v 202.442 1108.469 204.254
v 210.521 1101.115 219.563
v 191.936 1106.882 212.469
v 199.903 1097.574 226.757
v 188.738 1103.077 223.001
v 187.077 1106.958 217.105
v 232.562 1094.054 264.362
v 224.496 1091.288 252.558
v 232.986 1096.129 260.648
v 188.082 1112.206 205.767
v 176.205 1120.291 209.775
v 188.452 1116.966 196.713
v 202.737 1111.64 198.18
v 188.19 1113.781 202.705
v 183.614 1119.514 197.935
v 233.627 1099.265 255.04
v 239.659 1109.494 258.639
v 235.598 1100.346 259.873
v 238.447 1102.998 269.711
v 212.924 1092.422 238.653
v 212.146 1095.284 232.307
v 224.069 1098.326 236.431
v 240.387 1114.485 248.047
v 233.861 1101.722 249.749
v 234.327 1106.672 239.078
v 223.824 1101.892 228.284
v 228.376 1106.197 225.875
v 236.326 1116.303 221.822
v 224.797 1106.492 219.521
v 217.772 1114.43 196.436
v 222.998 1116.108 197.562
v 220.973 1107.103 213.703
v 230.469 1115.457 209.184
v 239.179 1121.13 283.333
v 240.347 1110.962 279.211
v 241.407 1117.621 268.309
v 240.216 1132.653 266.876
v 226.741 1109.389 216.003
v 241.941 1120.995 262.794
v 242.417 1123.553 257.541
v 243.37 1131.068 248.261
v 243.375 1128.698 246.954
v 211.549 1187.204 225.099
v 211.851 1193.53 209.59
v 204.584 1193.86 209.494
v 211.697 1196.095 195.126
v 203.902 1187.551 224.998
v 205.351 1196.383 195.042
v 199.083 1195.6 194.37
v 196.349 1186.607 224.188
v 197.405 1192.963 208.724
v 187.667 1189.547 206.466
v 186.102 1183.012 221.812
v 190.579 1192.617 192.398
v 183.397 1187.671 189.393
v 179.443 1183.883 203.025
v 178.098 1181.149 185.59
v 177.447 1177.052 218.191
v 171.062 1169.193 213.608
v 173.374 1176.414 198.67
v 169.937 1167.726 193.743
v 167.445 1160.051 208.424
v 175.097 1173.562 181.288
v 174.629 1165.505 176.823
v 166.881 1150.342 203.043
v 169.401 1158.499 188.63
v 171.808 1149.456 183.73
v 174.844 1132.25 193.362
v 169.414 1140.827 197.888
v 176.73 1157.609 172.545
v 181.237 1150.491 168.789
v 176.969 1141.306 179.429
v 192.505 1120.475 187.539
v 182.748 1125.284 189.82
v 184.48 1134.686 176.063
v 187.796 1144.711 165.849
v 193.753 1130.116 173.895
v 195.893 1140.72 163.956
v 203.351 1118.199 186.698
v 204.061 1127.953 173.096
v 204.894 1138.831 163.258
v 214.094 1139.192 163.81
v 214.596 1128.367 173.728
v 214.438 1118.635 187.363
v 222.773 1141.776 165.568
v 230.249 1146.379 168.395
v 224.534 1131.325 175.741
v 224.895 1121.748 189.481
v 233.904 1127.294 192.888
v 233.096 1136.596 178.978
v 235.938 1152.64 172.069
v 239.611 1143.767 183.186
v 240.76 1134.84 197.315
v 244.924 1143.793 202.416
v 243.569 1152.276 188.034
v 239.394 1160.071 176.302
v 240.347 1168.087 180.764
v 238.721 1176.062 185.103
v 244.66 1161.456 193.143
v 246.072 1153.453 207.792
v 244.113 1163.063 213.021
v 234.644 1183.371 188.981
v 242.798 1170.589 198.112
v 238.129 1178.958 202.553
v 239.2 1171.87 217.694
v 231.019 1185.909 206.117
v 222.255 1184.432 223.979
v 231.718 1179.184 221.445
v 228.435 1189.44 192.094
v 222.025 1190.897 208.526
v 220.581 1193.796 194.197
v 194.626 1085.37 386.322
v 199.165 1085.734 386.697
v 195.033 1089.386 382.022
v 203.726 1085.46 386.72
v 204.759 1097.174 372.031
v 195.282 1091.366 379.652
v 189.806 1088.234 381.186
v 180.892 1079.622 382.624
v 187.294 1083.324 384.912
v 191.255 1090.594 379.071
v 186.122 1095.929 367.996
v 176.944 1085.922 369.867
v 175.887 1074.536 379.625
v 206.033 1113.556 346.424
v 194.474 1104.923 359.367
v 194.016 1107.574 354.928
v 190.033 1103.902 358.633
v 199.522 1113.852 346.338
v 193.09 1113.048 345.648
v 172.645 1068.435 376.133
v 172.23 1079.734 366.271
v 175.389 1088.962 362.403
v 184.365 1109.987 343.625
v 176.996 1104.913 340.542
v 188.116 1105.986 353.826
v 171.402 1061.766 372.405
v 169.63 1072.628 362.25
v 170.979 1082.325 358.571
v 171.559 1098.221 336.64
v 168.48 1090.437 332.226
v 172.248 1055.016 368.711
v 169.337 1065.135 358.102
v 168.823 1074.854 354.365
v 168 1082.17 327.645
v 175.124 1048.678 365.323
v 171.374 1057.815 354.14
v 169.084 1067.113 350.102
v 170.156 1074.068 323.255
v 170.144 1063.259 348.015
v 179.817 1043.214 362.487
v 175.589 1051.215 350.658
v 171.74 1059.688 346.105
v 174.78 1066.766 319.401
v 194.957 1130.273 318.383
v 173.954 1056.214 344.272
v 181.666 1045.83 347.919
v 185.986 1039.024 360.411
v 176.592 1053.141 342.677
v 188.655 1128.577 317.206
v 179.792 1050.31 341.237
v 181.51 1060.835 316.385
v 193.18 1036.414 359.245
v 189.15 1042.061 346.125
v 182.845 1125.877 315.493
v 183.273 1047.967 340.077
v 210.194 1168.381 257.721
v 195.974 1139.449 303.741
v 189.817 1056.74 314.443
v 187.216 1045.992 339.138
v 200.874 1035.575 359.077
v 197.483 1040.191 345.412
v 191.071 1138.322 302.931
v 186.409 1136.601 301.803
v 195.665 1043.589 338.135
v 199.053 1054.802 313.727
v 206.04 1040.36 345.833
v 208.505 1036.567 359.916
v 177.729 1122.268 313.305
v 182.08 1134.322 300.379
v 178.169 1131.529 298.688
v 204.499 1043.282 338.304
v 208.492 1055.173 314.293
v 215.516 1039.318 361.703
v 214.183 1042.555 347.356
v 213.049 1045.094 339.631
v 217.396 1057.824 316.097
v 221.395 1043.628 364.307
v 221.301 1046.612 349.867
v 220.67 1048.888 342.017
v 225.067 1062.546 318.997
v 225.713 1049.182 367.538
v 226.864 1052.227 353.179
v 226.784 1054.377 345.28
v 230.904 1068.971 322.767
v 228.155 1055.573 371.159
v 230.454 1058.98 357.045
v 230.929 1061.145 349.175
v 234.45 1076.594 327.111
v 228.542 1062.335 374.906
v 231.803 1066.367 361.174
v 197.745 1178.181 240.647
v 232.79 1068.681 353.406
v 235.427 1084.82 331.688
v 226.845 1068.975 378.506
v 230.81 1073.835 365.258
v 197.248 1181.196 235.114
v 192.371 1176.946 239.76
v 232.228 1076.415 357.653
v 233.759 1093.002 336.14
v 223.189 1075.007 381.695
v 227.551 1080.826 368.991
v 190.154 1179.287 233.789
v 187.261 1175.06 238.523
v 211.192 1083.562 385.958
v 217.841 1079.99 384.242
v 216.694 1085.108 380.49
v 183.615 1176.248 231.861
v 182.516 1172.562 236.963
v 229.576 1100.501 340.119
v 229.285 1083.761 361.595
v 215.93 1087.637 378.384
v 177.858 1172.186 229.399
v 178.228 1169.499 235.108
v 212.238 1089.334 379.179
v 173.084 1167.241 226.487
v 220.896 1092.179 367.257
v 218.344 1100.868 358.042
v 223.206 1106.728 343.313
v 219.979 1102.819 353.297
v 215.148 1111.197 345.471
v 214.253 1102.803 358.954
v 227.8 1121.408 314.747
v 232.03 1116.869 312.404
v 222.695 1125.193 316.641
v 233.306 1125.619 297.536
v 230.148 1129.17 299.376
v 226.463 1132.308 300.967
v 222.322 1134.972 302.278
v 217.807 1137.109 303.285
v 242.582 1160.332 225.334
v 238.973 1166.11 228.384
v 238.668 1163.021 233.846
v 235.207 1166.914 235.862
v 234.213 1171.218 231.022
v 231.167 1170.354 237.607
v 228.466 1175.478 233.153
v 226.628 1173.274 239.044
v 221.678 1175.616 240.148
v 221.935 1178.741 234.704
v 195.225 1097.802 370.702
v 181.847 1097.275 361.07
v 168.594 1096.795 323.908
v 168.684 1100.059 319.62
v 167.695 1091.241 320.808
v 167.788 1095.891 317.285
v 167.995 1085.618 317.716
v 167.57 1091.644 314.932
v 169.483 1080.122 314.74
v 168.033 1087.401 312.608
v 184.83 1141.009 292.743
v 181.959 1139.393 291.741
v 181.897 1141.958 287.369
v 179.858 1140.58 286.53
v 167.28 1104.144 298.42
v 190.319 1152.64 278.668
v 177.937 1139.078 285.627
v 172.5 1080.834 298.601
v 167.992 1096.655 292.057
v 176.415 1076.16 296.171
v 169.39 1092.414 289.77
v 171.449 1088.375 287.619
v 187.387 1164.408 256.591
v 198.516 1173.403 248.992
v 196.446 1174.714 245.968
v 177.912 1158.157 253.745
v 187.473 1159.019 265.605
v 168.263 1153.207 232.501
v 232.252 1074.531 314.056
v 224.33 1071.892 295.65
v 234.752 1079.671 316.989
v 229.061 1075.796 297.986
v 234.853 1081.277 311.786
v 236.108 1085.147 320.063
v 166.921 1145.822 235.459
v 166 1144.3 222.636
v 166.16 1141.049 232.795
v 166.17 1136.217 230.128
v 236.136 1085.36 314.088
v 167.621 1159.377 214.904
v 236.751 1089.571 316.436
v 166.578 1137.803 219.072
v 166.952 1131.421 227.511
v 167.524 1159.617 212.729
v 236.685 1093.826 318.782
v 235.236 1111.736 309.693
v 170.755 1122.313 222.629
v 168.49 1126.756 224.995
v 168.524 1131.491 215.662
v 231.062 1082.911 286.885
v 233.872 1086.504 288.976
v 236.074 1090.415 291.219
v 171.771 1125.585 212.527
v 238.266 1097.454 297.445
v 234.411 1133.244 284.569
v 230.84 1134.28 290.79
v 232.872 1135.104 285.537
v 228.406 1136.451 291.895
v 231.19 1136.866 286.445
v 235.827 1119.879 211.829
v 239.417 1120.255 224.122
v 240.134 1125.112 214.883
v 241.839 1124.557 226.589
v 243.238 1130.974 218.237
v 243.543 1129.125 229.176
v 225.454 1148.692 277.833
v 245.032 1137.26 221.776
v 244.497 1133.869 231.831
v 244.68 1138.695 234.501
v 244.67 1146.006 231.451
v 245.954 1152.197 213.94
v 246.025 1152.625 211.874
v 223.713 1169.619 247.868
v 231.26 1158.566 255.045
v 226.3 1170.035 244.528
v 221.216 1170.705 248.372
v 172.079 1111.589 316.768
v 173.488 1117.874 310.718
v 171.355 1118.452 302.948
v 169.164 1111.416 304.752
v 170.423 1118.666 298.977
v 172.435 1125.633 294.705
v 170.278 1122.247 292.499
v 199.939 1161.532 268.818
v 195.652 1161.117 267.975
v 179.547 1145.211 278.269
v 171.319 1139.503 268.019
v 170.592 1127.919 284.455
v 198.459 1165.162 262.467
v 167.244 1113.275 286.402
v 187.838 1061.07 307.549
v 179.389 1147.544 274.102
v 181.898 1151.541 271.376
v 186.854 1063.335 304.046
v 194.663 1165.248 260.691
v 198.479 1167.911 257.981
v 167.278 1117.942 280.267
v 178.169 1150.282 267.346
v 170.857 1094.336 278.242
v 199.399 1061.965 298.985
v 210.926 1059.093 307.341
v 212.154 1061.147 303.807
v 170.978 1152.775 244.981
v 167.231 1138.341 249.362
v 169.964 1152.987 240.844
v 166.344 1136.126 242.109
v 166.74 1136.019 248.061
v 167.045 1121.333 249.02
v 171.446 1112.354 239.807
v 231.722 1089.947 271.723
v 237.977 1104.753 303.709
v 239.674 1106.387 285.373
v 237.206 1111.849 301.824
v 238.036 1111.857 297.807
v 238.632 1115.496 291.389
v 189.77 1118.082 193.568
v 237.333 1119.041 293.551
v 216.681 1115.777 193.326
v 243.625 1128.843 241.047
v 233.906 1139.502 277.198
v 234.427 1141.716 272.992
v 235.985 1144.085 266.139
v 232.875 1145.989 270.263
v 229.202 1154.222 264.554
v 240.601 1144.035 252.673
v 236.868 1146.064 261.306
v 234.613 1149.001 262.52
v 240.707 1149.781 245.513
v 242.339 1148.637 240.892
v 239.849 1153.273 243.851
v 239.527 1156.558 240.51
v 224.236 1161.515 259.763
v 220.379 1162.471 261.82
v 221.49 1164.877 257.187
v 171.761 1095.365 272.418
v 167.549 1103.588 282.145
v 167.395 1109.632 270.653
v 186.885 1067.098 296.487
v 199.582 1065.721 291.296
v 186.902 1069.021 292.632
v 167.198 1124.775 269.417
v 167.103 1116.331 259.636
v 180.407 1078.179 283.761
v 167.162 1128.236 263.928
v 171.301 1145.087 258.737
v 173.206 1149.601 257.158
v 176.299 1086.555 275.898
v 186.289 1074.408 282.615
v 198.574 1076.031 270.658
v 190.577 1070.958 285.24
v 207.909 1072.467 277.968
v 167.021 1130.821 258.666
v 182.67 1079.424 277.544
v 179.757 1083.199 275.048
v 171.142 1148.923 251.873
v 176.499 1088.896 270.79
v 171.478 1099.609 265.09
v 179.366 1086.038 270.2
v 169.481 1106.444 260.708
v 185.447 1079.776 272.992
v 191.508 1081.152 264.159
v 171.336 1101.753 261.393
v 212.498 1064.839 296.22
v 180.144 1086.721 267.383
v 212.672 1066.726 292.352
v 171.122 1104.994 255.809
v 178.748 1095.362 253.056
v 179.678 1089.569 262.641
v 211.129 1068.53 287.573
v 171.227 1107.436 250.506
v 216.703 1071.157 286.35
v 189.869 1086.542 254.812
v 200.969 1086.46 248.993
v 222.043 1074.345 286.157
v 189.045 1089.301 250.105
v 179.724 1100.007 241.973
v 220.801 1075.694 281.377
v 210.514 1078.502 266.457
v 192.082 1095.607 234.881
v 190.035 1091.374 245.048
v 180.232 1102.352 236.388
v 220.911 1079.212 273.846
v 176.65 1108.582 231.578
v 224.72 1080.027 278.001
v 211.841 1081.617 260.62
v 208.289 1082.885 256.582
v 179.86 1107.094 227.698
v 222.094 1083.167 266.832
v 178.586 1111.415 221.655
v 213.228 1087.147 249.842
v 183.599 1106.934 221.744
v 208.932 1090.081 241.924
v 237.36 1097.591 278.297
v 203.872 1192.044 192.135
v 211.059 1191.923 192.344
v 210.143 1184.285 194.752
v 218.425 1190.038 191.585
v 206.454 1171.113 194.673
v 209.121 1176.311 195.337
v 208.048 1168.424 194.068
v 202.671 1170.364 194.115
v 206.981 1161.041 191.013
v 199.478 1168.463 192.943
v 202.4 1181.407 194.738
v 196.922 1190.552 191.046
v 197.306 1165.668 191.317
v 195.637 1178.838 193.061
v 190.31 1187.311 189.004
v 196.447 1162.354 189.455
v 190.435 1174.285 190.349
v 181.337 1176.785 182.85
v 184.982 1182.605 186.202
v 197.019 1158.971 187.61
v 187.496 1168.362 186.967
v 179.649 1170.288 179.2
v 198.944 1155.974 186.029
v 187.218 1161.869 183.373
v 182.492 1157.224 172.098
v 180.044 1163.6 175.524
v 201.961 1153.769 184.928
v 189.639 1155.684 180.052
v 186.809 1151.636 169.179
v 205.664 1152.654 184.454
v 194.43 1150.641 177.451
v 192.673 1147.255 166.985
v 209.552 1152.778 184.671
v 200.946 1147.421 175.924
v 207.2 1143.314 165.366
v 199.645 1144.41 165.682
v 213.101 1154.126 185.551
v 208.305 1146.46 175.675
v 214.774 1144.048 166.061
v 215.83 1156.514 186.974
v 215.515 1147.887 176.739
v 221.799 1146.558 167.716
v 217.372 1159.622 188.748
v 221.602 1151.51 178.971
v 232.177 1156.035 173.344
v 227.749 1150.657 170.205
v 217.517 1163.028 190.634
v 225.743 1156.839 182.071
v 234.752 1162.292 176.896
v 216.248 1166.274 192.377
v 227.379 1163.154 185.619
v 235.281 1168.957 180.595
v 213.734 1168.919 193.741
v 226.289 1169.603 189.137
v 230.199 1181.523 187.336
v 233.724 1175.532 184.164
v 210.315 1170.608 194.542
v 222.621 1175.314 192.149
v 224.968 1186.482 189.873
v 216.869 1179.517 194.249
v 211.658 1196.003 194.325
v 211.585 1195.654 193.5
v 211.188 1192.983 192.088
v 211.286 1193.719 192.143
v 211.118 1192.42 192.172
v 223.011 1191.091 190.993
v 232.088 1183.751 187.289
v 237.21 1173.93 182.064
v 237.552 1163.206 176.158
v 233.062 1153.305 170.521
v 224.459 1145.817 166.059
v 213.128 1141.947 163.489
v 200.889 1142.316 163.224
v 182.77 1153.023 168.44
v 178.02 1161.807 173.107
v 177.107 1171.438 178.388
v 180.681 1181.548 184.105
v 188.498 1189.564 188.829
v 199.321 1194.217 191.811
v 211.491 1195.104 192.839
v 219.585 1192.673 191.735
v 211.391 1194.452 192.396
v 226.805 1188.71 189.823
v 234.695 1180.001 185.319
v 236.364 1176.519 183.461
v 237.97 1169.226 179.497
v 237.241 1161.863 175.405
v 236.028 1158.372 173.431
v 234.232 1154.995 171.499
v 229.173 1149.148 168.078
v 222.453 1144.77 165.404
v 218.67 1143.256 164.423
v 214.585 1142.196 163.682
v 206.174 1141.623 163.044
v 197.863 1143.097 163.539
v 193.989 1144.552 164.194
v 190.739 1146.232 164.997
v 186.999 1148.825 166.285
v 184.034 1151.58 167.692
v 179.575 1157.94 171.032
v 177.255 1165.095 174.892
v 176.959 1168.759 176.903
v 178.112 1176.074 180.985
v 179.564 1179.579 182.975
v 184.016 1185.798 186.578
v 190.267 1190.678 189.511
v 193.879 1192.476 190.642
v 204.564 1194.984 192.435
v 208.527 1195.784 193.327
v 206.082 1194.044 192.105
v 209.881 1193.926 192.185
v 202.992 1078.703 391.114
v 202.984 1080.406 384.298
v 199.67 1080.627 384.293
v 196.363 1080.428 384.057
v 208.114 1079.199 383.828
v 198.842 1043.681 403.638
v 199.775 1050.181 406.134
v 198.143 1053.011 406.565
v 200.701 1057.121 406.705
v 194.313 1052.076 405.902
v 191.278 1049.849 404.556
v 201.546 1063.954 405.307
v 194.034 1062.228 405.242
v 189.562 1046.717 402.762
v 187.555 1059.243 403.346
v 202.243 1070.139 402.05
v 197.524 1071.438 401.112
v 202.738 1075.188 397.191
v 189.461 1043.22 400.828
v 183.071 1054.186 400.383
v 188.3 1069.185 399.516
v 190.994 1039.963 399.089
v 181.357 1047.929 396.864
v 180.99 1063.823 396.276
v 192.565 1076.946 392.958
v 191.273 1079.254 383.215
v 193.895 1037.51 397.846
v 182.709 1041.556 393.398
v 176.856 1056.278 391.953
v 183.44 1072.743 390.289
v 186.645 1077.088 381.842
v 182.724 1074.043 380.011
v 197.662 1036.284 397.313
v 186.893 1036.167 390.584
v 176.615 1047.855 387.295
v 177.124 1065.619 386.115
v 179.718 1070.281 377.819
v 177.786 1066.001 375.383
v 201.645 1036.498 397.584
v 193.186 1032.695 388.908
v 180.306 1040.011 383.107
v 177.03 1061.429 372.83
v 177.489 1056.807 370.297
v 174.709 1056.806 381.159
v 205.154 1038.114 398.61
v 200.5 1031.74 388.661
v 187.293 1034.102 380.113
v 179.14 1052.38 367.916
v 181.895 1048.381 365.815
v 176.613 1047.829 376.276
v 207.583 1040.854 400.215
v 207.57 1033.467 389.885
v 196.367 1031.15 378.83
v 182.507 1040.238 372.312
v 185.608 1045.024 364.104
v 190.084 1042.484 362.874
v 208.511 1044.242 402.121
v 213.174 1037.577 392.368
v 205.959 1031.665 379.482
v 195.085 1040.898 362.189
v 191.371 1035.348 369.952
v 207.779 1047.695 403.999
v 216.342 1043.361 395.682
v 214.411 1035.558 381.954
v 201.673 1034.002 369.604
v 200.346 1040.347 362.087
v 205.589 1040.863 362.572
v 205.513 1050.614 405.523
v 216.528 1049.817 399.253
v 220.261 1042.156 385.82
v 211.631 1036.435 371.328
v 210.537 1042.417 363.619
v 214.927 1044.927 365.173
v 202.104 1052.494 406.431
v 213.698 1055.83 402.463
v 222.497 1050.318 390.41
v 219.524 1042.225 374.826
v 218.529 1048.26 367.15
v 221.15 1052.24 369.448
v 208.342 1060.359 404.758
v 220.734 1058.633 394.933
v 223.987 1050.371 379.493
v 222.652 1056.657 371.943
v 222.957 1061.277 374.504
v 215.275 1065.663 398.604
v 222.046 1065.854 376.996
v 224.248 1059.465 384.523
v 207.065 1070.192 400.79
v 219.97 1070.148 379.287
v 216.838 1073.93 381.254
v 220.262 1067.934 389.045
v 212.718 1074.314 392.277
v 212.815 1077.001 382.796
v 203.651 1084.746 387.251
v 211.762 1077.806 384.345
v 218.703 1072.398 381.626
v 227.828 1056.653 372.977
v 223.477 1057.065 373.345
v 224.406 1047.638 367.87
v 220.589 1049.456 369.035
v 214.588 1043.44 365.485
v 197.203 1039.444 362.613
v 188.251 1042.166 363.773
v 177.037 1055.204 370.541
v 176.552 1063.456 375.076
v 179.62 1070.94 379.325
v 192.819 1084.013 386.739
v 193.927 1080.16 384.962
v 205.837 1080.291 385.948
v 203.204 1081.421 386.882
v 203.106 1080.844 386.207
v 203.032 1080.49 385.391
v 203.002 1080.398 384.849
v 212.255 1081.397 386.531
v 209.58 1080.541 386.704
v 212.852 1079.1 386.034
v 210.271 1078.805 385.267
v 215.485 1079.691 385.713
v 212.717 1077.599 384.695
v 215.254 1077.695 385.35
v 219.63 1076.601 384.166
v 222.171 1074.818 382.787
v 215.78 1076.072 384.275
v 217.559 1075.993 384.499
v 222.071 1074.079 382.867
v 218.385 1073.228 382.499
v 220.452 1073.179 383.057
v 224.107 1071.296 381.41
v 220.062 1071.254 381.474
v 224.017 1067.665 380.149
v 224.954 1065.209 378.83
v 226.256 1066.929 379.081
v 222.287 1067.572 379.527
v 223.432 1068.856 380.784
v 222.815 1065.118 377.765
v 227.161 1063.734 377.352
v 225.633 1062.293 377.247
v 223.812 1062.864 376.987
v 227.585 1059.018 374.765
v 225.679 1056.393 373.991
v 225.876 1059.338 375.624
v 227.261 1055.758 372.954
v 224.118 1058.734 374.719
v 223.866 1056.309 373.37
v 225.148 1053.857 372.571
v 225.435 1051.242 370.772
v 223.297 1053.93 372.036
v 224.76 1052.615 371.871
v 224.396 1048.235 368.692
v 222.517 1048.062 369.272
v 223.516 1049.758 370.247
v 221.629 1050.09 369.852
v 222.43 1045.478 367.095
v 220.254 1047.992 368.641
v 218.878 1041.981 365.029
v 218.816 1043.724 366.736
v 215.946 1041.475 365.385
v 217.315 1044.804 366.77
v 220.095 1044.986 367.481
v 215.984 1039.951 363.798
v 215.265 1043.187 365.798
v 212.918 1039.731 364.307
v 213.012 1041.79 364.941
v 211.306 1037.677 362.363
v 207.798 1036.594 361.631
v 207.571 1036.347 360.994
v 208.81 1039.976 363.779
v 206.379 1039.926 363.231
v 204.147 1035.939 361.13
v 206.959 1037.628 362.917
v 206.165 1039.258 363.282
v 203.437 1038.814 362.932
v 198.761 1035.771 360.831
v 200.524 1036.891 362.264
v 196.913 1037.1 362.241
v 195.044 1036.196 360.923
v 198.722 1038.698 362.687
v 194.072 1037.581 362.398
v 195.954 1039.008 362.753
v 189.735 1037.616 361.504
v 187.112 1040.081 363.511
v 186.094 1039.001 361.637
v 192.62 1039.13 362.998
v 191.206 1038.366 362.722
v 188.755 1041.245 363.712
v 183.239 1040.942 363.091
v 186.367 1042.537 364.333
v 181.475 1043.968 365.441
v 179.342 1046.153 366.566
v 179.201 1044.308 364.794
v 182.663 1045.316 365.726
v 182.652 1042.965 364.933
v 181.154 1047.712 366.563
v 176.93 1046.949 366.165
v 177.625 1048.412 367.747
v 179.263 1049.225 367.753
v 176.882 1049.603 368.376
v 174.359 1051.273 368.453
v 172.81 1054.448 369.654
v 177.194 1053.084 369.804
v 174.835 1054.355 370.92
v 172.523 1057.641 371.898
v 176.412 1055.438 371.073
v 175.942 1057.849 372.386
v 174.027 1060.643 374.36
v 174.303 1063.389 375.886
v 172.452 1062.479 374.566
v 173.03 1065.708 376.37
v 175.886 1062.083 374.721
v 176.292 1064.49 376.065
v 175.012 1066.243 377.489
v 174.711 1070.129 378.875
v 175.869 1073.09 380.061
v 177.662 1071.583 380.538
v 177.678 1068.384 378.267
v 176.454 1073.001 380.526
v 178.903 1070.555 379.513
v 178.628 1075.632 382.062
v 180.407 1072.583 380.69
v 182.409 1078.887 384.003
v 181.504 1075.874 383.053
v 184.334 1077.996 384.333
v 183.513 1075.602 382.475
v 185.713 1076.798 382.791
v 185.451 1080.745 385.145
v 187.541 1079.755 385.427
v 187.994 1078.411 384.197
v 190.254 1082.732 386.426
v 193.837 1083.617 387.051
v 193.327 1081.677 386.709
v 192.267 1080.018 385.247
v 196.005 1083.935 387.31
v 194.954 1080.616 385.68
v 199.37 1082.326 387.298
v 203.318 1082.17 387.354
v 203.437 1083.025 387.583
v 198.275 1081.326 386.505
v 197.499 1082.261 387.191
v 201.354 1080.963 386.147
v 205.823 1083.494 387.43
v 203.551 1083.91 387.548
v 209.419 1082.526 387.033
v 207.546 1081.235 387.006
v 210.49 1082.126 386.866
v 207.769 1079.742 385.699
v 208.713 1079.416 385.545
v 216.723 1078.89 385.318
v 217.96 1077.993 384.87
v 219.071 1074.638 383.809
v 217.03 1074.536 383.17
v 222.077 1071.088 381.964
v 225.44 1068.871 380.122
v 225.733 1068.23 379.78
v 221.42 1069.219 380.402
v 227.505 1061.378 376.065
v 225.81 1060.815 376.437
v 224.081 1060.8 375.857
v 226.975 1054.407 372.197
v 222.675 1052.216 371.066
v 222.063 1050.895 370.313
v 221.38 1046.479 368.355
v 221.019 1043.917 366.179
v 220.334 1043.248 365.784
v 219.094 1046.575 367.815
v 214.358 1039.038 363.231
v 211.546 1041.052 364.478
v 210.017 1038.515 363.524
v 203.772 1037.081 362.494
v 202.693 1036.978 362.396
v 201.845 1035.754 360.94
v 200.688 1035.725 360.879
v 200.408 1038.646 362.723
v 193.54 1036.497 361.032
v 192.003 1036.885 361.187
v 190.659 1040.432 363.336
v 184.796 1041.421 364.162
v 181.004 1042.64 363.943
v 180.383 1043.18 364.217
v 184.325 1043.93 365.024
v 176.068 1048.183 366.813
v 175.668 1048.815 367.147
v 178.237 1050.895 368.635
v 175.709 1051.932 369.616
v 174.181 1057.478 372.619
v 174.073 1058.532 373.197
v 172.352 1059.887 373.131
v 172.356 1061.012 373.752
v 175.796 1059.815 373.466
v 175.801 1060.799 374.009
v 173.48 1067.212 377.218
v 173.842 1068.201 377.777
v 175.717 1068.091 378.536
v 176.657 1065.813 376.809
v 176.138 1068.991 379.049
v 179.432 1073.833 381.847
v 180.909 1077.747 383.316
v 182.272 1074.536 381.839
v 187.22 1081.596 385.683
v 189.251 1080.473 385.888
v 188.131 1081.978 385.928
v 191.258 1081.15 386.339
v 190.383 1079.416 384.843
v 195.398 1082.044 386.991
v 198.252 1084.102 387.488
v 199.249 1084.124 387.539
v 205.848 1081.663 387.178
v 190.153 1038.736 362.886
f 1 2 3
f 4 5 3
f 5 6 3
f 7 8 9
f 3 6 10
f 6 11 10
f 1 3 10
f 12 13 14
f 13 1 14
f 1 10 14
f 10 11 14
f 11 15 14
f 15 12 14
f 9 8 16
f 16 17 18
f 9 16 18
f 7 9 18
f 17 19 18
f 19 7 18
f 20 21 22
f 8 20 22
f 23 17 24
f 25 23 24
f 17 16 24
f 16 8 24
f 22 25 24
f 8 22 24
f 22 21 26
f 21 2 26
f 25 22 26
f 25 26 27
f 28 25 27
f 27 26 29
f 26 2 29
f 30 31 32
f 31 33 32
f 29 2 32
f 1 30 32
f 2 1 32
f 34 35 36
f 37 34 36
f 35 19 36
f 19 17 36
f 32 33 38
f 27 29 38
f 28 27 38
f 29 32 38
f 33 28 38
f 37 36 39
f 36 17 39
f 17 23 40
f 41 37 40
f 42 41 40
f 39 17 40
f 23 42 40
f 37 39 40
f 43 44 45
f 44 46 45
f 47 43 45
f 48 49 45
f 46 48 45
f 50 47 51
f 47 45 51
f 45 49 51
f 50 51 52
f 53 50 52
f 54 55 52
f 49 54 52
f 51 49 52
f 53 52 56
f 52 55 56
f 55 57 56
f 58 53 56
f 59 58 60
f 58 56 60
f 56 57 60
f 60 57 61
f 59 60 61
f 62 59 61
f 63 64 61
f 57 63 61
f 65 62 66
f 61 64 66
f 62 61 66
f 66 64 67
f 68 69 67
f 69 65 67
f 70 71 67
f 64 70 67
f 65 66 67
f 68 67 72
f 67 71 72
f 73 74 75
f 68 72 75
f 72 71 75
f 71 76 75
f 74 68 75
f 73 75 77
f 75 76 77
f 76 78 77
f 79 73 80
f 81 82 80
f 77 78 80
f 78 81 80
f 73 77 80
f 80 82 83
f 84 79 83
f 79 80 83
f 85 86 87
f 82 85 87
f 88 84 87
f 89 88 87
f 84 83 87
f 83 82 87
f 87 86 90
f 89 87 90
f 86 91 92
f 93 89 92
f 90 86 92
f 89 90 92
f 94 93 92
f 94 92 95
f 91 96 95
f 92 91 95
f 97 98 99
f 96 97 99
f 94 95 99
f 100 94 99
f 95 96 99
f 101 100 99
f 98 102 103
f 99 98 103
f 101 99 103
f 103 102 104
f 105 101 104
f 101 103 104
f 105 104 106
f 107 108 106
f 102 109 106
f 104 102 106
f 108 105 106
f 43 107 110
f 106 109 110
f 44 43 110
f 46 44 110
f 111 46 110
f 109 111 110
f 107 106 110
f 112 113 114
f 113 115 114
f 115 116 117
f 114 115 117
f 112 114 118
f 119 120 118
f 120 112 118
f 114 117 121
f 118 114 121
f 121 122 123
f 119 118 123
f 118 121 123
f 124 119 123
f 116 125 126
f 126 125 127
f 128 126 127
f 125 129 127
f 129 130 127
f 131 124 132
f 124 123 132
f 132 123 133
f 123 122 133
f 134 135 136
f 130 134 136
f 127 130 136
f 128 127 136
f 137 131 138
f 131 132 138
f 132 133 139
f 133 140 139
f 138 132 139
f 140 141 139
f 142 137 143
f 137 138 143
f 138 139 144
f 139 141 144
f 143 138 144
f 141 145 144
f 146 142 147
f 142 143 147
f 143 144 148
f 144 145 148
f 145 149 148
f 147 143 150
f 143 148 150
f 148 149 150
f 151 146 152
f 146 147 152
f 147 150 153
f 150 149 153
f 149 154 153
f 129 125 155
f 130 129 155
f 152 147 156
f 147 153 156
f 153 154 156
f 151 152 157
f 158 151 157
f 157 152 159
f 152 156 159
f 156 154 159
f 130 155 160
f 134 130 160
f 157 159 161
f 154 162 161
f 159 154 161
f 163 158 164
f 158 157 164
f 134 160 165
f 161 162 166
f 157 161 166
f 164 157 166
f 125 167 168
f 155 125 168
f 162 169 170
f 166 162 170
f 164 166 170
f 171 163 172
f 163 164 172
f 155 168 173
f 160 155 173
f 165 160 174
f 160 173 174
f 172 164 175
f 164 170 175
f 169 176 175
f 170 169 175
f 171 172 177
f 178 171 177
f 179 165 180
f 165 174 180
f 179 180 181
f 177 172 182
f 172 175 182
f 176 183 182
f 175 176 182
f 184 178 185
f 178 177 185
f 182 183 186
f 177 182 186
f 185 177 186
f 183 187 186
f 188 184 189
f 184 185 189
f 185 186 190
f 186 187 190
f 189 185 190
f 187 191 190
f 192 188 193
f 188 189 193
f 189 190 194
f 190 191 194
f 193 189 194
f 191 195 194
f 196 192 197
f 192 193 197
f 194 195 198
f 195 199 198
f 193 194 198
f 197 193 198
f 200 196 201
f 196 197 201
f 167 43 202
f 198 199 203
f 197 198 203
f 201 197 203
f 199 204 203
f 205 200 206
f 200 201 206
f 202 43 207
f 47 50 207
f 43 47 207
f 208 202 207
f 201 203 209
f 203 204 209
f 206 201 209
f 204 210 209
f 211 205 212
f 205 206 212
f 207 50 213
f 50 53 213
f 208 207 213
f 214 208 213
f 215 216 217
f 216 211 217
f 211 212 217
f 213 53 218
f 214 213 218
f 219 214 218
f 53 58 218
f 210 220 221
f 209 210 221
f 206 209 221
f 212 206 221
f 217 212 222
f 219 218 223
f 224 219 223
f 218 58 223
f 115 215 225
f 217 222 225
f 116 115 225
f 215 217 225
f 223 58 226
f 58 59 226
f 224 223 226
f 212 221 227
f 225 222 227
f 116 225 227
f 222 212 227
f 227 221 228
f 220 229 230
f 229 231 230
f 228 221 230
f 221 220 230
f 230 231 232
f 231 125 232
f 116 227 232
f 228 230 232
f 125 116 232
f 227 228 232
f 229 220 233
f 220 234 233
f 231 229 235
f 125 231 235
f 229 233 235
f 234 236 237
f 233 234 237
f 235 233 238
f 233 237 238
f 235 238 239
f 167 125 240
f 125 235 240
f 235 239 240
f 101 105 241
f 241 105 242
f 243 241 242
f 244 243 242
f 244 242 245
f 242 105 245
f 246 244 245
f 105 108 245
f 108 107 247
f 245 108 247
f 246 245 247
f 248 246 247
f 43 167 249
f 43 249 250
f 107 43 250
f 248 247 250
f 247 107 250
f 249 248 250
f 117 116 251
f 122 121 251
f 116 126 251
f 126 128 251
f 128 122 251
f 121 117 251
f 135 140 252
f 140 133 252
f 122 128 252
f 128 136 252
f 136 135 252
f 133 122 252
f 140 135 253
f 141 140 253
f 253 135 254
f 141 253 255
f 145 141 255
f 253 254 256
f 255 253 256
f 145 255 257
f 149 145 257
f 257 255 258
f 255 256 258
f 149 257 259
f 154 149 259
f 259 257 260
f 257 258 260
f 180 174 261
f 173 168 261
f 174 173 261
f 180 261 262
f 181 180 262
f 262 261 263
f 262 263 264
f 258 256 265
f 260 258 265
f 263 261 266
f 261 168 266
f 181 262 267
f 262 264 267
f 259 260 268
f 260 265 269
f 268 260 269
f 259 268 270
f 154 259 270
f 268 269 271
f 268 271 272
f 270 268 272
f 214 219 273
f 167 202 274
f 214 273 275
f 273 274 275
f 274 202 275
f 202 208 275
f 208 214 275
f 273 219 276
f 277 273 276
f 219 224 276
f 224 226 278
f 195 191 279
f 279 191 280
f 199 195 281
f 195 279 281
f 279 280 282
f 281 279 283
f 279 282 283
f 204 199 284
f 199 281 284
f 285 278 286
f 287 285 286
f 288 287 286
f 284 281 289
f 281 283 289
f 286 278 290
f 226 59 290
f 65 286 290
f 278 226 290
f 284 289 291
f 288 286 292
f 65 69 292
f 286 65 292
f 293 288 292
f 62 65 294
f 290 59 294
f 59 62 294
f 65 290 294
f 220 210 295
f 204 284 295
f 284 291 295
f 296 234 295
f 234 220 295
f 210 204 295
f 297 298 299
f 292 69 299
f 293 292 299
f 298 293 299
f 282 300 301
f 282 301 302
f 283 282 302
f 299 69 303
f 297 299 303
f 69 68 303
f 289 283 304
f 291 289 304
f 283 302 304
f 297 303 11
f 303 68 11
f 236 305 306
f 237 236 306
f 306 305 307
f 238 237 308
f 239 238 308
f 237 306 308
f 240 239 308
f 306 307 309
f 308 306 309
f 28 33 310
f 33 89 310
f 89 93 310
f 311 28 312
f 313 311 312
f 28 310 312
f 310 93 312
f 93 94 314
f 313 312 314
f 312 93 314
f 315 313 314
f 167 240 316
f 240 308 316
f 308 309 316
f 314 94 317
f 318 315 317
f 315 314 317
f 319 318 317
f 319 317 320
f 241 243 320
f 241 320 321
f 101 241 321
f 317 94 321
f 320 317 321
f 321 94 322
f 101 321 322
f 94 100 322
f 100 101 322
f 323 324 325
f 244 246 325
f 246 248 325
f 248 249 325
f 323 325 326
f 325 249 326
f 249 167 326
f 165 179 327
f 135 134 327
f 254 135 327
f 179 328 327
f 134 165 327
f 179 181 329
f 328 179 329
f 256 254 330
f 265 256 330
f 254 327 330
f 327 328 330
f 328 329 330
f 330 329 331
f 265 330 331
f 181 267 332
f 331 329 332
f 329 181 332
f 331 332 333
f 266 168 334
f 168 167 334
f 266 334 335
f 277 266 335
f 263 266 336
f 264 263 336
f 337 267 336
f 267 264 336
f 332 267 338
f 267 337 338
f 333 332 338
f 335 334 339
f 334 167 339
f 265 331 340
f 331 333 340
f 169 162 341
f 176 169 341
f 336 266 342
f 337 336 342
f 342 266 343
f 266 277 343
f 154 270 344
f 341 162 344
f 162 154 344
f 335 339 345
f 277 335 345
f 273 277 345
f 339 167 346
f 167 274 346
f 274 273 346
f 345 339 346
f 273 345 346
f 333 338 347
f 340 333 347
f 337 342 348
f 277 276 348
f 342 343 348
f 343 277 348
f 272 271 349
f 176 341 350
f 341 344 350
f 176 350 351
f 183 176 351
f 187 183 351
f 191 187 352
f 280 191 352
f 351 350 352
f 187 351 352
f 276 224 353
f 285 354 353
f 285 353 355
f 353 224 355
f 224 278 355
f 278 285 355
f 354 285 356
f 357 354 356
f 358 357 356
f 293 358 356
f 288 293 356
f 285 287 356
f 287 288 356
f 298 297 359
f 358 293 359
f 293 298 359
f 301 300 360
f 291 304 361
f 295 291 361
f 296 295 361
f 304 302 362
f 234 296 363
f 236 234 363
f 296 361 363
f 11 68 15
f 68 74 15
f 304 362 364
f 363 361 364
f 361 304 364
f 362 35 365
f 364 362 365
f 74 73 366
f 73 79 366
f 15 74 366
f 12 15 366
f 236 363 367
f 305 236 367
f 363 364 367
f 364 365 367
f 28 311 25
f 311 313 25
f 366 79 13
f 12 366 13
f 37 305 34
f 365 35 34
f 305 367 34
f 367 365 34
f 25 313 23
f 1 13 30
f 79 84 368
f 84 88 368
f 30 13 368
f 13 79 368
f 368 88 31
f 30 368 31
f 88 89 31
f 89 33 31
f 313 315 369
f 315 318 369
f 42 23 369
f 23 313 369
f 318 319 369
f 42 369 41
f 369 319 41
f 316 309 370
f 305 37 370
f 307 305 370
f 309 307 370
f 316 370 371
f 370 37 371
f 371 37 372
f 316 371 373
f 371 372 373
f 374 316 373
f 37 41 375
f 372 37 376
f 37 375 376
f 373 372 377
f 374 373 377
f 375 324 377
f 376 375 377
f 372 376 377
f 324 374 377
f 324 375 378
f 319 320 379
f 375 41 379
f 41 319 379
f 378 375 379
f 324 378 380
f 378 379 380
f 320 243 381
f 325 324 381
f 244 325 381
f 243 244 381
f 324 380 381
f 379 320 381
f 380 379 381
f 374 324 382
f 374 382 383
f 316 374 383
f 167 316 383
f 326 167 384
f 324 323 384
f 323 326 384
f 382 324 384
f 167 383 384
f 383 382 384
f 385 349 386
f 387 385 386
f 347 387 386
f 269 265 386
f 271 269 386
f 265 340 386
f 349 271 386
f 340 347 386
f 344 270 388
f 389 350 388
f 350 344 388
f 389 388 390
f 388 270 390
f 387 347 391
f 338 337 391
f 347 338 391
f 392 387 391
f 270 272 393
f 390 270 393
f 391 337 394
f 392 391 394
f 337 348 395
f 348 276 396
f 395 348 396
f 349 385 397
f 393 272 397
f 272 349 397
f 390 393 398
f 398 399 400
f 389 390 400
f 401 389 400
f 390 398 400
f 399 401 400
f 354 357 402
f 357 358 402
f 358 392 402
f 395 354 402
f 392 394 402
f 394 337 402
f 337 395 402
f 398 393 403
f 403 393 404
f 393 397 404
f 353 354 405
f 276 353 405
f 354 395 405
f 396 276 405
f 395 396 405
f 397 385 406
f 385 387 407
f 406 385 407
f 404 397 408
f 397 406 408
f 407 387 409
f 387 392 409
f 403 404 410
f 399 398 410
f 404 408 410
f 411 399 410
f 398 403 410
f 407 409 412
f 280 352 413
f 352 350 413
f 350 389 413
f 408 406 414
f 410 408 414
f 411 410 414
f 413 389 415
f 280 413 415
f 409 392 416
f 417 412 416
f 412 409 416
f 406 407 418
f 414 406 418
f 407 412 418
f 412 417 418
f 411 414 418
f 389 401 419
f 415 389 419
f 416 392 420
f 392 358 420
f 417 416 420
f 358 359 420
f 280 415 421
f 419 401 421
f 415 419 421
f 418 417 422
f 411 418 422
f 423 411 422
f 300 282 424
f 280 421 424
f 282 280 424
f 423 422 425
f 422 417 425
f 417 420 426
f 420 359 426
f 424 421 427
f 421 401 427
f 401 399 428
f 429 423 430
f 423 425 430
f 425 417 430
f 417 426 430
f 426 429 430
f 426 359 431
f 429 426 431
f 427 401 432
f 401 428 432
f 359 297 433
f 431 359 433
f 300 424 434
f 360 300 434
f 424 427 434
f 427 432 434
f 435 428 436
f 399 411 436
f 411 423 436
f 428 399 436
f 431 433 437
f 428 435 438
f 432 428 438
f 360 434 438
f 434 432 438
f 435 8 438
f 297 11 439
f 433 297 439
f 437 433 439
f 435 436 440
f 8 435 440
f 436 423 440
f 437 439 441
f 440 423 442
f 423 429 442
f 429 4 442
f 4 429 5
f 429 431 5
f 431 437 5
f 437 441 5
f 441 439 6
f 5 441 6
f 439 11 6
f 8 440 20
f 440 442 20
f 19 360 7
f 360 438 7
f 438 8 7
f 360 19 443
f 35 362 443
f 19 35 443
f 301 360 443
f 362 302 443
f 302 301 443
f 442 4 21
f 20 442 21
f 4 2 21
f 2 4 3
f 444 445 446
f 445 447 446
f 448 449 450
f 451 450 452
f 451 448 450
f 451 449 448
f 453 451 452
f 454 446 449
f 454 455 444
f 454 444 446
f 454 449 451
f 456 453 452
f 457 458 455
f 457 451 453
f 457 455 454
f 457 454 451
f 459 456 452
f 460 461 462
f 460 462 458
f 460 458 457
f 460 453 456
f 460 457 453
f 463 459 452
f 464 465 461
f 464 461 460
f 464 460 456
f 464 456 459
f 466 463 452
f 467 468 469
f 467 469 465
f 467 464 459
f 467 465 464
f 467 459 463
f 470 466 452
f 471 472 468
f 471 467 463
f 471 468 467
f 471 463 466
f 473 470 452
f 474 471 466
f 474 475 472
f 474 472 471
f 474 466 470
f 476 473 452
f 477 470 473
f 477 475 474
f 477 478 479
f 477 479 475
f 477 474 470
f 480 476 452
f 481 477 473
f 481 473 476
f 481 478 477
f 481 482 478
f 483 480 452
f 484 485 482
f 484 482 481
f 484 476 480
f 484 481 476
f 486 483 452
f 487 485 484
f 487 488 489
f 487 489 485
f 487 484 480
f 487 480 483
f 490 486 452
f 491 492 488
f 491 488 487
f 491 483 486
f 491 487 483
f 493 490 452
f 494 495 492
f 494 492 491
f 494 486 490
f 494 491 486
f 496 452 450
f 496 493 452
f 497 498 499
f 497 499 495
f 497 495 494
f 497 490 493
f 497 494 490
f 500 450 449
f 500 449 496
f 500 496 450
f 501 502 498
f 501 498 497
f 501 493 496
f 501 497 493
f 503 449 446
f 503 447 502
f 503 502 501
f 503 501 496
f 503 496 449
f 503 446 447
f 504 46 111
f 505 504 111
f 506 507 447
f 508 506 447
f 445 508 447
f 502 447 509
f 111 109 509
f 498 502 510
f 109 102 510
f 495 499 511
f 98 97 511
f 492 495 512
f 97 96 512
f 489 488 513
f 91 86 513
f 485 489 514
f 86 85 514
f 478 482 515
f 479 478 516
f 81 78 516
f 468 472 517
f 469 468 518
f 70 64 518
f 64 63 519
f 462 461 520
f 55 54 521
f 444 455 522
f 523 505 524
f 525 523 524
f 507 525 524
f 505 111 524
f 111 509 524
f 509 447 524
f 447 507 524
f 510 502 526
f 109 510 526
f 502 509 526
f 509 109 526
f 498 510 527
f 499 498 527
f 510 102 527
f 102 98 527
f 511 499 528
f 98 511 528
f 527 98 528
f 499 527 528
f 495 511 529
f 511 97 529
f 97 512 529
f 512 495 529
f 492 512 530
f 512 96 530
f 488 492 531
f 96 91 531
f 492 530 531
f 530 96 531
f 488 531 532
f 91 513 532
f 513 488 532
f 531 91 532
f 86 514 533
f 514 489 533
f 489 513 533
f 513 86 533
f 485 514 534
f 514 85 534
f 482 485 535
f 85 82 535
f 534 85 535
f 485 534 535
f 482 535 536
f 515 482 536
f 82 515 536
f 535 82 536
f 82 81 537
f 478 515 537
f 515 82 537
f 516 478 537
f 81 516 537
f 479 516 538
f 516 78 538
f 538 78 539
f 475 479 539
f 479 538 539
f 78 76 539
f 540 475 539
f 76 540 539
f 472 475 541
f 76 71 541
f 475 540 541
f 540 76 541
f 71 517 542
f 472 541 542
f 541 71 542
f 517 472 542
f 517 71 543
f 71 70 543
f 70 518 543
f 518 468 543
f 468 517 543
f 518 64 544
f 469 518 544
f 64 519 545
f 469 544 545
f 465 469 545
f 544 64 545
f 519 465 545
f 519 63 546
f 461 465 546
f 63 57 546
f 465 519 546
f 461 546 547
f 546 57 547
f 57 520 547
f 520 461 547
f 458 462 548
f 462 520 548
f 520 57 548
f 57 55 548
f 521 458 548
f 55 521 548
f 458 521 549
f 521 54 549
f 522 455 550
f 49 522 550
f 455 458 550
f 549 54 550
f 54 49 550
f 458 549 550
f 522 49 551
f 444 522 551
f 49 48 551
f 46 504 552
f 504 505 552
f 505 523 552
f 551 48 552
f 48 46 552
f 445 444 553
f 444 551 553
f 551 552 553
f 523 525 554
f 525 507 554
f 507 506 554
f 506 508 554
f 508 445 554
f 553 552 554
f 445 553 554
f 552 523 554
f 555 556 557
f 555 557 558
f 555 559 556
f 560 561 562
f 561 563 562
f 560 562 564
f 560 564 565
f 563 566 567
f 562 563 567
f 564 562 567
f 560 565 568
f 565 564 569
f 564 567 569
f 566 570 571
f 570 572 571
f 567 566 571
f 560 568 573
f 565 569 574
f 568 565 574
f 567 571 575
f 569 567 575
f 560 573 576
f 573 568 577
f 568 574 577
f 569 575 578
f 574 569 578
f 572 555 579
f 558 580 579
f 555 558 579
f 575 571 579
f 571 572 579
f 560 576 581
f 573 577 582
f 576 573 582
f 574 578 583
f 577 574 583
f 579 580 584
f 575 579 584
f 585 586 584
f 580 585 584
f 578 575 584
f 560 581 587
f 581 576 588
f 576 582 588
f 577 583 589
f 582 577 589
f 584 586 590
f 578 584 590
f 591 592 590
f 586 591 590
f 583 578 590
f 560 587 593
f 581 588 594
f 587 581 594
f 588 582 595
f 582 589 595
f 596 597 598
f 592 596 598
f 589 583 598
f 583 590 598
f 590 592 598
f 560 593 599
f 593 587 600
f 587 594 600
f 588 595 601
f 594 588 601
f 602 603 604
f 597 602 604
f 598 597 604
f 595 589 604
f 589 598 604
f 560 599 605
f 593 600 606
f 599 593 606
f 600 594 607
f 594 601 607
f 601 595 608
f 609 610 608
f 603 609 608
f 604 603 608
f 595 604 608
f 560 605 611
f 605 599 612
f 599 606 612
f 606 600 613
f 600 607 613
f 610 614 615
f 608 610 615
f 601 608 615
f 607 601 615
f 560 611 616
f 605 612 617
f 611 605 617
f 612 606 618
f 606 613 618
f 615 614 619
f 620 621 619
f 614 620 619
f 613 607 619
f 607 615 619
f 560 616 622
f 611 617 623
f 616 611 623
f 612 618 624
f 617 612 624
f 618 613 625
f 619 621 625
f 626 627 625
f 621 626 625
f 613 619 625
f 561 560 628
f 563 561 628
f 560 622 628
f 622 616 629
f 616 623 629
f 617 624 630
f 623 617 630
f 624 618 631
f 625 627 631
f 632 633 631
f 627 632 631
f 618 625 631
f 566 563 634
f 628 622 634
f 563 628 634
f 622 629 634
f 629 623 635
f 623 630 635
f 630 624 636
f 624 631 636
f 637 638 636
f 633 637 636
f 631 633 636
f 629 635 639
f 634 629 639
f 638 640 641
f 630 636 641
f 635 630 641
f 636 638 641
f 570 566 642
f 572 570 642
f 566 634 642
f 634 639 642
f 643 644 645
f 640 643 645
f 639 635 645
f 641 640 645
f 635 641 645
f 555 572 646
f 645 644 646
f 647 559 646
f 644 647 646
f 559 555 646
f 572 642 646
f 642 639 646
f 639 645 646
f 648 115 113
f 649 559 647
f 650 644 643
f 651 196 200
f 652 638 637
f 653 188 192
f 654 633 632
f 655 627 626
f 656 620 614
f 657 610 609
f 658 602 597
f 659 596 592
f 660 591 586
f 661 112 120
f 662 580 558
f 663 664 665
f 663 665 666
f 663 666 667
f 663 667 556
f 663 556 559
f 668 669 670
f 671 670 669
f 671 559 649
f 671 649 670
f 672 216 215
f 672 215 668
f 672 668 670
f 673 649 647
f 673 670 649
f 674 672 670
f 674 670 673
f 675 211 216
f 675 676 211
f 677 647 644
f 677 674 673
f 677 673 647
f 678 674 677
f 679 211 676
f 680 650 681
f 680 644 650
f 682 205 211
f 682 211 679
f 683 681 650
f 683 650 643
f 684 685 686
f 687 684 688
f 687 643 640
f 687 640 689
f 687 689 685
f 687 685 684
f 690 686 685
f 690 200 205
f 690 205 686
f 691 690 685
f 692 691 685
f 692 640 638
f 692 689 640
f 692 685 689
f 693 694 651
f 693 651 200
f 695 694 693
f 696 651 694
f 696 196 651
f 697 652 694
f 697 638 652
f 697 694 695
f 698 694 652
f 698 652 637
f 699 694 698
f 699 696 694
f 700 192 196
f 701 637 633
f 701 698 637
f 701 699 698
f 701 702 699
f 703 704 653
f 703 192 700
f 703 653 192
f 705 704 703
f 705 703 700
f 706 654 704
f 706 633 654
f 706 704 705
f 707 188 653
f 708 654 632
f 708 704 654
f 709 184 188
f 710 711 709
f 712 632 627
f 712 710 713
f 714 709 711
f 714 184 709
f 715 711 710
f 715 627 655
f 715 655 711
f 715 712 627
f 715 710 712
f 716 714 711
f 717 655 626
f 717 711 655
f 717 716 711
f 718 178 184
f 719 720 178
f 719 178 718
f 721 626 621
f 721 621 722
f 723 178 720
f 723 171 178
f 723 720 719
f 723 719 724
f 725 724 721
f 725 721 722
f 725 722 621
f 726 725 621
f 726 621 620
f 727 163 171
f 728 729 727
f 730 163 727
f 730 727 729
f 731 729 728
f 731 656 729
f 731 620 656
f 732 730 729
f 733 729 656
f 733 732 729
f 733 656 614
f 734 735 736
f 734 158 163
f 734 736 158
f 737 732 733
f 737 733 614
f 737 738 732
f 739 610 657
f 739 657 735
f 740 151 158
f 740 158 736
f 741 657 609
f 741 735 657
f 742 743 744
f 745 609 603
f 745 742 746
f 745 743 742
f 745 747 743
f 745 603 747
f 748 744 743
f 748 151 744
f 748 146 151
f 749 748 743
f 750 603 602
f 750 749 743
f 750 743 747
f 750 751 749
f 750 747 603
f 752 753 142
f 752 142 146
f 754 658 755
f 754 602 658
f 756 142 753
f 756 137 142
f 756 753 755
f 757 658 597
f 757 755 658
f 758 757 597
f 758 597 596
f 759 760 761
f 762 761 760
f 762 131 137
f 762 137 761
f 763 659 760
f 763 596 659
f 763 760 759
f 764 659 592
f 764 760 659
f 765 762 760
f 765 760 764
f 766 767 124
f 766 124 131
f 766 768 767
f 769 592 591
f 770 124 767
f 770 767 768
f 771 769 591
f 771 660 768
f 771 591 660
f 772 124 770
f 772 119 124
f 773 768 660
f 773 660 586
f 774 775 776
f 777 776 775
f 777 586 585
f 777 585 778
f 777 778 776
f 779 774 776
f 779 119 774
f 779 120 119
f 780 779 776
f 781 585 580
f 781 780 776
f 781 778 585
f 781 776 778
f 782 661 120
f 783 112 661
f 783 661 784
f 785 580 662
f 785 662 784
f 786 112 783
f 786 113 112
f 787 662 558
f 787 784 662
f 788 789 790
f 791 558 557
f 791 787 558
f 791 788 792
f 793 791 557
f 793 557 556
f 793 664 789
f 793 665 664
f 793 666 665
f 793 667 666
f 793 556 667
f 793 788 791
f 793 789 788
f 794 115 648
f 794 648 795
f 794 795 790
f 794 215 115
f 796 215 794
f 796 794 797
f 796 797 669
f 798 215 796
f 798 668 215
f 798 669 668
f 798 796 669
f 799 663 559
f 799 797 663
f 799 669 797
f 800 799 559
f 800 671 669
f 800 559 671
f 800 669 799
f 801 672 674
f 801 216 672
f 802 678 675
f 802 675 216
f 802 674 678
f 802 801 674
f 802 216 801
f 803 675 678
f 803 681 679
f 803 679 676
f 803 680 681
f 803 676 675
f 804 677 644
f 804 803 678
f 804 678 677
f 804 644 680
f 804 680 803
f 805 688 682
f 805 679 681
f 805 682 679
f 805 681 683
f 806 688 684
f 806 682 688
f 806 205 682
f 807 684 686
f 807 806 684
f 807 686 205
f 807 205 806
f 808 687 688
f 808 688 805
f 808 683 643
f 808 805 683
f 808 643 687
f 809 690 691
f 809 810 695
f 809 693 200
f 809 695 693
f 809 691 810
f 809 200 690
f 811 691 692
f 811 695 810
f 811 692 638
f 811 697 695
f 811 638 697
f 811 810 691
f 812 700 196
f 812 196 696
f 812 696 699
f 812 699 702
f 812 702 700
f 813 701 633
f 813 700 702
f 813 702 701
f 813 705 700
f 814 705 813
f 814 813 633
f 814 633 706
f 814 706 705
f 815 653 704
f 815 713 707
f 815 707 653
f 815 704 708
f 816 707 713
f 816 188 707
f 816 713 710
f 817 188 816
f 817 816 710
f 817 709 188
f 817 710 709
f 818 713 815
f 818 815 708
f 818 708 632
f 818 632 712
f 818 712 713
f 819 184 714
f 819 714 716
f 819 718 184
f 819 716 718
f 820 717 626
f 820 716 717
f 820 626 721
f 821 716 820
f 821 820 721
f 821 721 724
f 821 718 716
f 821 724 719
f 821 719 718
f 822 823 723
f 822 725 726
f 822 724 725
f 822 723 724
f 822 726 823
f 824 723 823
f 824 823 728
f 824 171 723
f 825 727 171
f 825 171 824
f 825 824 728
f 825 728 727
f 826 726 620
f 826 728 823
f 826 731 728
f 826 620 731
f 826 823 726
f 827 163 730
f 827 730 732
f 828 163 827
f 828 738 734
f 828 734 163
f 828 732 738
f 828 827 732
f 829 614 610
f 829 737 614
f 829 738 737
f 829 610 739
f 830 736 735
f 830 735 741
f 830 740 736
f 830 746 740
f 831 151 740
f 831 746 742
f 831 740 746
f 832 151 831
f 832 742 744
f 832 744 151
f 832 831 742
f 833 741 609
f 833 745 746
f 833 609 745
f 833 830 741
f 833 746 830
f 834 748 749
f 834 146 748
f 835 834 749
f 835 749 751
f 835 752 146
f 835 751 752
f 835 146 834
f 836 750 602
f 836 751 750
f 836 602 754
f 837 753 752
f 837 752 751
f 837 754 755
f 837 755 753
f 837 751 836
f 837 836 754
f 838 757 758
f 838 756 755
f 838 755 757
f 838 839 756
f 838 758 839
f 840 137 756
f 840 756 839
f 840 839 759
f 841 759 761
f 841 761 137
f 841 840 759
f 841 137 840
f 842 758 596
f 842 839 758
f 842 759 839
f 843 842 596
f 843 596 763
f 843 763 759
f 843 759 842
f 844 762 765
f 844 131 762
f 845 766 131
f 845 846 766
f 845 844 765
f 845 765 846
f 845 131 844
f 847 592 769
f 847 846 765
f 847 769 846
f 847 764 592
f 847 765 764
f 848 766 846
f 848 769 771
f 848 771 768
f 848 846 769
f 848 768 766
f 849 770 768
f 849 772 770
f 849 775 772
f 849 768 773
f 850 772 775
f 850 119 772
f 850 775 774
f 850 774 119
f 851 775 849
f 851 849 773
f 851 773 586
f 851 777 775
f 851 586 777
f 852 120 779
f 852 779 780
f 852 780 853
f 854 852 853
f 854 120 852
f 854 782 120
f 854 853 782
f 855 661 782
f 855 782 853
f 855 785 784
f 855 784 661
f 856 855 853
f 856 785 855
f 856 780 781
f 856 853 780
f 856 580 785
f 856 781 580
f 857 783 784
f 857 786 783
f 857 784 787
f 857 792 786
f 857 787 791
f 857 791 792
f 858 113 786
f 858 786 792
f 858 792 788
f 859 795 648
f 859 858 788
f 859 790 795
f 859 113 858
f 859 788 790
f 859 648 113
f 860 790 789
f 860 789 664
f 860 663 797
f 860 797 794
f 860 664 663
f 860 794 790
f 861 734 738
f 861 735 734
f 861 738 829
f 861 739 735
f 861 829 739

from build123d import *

# Parameters (mm, degrees)
FILLET088_R             = 3
FILLET089_R             = 3
BODY053_ROLL_ANGLE      = 86.032869
BODY053_PITCH_ANGLE     = -61.044976
BODY053_PLACEMENT_ANGLE = -93.967131


with BuildPart() as part:
    # Sketch178 → Revolution092 (revolve)
    with BuildSketch(Plane.XY):
        with BuildLine():
            Line((5.147949, 0), (267.265, 0))
            add(Edge.make_bspline(
                [(267.265, 0), (263.840897, 29.07099), (216.842712, 33.126465), (91.435905, 38.640092), (3.238657, 43.599544), (5.147949, 0)],
                knots=[0, 0, 0, 0, 0.333333, 0.666667, 1, 1, 1, 1], degree=3))
        make_face()
    revolve(axis=Axis((0, 0, 0), (1, 0, 0)))

    # Sketch179 → Groove086 (revolve, cut)
    with BuildSketch(Plane.XY):
        with BuildLine():
            Line((-35, 0), (35, 0))
            ThreePointArc((35, 0), (0, 35), (-35, 0))
        make_face()
    revolve(axis=Axis((0, 0, 0), (1, 0, 0)), mode=Mode.SUBTRACT)

    # Fillet088
    fillet088_edges = [part.edges().sort_by_distance(p)[0] for p in [
        (17.386166, -30.376327, 0),
    ]]
    fillet(fillet088_edges, radius=FILLET088_R)

    # Sketch180 → Groove087 (revolve, cut)
    with BuildSketch(Plane.XY):
        with BuildLine():
            Line((228, 0), (278, 0))
            ThreePointArc((278, 0), (253, 25), (228, 0))
        make_face()
    revolve(axis=Axis((0, 0, 0), (1, 0, 0)), mode=Mode.SUBTRACT)

    # Fillet089
    fillet089_edges = [part.edges().sort_by_distance(p)[0] for p in [
        (251.985595, -24.979411, 0),
    ]]
    fillet(fillet089_edges, radius=FILLET089_R)

    # Sketch180 → Revolution093 (revolve)
    with BuildSketch(Plane.XY):
        with BuildLine():
            Line((228, 0), (278, 0))
            ThreePointArc((278, 0), (253, 25), (228, 0))
        make_face()
    revolve(axis=Axis((0, 0, 0), (1, 0, 0)))


with BuildPart() as part_1:
    # Body053 roll: moved
    add(part.part.rotate(Axis((0, 0, 0), (1, 0, 0)), BODY053_ROLL_ANGLE))


with BuildPart() as part_2:
    # Body053 pitch: moved
    add(part_1.part.rotate(Axis((0, 0, 0), (0, 1, 0)), BODY053_PITCH_ANGLE))


with BuildPart() as part_3:
    # Body053 placement: moved
    add(part_2.part.moved(Location((208.153308, 1177.944739, 160.388141))).rotate(Axis((208.153308, 1177.944739, 160.388141), (0, 0, 1)), BODY053_PLACEMENT_ANGLE))


solid = part_3.part
